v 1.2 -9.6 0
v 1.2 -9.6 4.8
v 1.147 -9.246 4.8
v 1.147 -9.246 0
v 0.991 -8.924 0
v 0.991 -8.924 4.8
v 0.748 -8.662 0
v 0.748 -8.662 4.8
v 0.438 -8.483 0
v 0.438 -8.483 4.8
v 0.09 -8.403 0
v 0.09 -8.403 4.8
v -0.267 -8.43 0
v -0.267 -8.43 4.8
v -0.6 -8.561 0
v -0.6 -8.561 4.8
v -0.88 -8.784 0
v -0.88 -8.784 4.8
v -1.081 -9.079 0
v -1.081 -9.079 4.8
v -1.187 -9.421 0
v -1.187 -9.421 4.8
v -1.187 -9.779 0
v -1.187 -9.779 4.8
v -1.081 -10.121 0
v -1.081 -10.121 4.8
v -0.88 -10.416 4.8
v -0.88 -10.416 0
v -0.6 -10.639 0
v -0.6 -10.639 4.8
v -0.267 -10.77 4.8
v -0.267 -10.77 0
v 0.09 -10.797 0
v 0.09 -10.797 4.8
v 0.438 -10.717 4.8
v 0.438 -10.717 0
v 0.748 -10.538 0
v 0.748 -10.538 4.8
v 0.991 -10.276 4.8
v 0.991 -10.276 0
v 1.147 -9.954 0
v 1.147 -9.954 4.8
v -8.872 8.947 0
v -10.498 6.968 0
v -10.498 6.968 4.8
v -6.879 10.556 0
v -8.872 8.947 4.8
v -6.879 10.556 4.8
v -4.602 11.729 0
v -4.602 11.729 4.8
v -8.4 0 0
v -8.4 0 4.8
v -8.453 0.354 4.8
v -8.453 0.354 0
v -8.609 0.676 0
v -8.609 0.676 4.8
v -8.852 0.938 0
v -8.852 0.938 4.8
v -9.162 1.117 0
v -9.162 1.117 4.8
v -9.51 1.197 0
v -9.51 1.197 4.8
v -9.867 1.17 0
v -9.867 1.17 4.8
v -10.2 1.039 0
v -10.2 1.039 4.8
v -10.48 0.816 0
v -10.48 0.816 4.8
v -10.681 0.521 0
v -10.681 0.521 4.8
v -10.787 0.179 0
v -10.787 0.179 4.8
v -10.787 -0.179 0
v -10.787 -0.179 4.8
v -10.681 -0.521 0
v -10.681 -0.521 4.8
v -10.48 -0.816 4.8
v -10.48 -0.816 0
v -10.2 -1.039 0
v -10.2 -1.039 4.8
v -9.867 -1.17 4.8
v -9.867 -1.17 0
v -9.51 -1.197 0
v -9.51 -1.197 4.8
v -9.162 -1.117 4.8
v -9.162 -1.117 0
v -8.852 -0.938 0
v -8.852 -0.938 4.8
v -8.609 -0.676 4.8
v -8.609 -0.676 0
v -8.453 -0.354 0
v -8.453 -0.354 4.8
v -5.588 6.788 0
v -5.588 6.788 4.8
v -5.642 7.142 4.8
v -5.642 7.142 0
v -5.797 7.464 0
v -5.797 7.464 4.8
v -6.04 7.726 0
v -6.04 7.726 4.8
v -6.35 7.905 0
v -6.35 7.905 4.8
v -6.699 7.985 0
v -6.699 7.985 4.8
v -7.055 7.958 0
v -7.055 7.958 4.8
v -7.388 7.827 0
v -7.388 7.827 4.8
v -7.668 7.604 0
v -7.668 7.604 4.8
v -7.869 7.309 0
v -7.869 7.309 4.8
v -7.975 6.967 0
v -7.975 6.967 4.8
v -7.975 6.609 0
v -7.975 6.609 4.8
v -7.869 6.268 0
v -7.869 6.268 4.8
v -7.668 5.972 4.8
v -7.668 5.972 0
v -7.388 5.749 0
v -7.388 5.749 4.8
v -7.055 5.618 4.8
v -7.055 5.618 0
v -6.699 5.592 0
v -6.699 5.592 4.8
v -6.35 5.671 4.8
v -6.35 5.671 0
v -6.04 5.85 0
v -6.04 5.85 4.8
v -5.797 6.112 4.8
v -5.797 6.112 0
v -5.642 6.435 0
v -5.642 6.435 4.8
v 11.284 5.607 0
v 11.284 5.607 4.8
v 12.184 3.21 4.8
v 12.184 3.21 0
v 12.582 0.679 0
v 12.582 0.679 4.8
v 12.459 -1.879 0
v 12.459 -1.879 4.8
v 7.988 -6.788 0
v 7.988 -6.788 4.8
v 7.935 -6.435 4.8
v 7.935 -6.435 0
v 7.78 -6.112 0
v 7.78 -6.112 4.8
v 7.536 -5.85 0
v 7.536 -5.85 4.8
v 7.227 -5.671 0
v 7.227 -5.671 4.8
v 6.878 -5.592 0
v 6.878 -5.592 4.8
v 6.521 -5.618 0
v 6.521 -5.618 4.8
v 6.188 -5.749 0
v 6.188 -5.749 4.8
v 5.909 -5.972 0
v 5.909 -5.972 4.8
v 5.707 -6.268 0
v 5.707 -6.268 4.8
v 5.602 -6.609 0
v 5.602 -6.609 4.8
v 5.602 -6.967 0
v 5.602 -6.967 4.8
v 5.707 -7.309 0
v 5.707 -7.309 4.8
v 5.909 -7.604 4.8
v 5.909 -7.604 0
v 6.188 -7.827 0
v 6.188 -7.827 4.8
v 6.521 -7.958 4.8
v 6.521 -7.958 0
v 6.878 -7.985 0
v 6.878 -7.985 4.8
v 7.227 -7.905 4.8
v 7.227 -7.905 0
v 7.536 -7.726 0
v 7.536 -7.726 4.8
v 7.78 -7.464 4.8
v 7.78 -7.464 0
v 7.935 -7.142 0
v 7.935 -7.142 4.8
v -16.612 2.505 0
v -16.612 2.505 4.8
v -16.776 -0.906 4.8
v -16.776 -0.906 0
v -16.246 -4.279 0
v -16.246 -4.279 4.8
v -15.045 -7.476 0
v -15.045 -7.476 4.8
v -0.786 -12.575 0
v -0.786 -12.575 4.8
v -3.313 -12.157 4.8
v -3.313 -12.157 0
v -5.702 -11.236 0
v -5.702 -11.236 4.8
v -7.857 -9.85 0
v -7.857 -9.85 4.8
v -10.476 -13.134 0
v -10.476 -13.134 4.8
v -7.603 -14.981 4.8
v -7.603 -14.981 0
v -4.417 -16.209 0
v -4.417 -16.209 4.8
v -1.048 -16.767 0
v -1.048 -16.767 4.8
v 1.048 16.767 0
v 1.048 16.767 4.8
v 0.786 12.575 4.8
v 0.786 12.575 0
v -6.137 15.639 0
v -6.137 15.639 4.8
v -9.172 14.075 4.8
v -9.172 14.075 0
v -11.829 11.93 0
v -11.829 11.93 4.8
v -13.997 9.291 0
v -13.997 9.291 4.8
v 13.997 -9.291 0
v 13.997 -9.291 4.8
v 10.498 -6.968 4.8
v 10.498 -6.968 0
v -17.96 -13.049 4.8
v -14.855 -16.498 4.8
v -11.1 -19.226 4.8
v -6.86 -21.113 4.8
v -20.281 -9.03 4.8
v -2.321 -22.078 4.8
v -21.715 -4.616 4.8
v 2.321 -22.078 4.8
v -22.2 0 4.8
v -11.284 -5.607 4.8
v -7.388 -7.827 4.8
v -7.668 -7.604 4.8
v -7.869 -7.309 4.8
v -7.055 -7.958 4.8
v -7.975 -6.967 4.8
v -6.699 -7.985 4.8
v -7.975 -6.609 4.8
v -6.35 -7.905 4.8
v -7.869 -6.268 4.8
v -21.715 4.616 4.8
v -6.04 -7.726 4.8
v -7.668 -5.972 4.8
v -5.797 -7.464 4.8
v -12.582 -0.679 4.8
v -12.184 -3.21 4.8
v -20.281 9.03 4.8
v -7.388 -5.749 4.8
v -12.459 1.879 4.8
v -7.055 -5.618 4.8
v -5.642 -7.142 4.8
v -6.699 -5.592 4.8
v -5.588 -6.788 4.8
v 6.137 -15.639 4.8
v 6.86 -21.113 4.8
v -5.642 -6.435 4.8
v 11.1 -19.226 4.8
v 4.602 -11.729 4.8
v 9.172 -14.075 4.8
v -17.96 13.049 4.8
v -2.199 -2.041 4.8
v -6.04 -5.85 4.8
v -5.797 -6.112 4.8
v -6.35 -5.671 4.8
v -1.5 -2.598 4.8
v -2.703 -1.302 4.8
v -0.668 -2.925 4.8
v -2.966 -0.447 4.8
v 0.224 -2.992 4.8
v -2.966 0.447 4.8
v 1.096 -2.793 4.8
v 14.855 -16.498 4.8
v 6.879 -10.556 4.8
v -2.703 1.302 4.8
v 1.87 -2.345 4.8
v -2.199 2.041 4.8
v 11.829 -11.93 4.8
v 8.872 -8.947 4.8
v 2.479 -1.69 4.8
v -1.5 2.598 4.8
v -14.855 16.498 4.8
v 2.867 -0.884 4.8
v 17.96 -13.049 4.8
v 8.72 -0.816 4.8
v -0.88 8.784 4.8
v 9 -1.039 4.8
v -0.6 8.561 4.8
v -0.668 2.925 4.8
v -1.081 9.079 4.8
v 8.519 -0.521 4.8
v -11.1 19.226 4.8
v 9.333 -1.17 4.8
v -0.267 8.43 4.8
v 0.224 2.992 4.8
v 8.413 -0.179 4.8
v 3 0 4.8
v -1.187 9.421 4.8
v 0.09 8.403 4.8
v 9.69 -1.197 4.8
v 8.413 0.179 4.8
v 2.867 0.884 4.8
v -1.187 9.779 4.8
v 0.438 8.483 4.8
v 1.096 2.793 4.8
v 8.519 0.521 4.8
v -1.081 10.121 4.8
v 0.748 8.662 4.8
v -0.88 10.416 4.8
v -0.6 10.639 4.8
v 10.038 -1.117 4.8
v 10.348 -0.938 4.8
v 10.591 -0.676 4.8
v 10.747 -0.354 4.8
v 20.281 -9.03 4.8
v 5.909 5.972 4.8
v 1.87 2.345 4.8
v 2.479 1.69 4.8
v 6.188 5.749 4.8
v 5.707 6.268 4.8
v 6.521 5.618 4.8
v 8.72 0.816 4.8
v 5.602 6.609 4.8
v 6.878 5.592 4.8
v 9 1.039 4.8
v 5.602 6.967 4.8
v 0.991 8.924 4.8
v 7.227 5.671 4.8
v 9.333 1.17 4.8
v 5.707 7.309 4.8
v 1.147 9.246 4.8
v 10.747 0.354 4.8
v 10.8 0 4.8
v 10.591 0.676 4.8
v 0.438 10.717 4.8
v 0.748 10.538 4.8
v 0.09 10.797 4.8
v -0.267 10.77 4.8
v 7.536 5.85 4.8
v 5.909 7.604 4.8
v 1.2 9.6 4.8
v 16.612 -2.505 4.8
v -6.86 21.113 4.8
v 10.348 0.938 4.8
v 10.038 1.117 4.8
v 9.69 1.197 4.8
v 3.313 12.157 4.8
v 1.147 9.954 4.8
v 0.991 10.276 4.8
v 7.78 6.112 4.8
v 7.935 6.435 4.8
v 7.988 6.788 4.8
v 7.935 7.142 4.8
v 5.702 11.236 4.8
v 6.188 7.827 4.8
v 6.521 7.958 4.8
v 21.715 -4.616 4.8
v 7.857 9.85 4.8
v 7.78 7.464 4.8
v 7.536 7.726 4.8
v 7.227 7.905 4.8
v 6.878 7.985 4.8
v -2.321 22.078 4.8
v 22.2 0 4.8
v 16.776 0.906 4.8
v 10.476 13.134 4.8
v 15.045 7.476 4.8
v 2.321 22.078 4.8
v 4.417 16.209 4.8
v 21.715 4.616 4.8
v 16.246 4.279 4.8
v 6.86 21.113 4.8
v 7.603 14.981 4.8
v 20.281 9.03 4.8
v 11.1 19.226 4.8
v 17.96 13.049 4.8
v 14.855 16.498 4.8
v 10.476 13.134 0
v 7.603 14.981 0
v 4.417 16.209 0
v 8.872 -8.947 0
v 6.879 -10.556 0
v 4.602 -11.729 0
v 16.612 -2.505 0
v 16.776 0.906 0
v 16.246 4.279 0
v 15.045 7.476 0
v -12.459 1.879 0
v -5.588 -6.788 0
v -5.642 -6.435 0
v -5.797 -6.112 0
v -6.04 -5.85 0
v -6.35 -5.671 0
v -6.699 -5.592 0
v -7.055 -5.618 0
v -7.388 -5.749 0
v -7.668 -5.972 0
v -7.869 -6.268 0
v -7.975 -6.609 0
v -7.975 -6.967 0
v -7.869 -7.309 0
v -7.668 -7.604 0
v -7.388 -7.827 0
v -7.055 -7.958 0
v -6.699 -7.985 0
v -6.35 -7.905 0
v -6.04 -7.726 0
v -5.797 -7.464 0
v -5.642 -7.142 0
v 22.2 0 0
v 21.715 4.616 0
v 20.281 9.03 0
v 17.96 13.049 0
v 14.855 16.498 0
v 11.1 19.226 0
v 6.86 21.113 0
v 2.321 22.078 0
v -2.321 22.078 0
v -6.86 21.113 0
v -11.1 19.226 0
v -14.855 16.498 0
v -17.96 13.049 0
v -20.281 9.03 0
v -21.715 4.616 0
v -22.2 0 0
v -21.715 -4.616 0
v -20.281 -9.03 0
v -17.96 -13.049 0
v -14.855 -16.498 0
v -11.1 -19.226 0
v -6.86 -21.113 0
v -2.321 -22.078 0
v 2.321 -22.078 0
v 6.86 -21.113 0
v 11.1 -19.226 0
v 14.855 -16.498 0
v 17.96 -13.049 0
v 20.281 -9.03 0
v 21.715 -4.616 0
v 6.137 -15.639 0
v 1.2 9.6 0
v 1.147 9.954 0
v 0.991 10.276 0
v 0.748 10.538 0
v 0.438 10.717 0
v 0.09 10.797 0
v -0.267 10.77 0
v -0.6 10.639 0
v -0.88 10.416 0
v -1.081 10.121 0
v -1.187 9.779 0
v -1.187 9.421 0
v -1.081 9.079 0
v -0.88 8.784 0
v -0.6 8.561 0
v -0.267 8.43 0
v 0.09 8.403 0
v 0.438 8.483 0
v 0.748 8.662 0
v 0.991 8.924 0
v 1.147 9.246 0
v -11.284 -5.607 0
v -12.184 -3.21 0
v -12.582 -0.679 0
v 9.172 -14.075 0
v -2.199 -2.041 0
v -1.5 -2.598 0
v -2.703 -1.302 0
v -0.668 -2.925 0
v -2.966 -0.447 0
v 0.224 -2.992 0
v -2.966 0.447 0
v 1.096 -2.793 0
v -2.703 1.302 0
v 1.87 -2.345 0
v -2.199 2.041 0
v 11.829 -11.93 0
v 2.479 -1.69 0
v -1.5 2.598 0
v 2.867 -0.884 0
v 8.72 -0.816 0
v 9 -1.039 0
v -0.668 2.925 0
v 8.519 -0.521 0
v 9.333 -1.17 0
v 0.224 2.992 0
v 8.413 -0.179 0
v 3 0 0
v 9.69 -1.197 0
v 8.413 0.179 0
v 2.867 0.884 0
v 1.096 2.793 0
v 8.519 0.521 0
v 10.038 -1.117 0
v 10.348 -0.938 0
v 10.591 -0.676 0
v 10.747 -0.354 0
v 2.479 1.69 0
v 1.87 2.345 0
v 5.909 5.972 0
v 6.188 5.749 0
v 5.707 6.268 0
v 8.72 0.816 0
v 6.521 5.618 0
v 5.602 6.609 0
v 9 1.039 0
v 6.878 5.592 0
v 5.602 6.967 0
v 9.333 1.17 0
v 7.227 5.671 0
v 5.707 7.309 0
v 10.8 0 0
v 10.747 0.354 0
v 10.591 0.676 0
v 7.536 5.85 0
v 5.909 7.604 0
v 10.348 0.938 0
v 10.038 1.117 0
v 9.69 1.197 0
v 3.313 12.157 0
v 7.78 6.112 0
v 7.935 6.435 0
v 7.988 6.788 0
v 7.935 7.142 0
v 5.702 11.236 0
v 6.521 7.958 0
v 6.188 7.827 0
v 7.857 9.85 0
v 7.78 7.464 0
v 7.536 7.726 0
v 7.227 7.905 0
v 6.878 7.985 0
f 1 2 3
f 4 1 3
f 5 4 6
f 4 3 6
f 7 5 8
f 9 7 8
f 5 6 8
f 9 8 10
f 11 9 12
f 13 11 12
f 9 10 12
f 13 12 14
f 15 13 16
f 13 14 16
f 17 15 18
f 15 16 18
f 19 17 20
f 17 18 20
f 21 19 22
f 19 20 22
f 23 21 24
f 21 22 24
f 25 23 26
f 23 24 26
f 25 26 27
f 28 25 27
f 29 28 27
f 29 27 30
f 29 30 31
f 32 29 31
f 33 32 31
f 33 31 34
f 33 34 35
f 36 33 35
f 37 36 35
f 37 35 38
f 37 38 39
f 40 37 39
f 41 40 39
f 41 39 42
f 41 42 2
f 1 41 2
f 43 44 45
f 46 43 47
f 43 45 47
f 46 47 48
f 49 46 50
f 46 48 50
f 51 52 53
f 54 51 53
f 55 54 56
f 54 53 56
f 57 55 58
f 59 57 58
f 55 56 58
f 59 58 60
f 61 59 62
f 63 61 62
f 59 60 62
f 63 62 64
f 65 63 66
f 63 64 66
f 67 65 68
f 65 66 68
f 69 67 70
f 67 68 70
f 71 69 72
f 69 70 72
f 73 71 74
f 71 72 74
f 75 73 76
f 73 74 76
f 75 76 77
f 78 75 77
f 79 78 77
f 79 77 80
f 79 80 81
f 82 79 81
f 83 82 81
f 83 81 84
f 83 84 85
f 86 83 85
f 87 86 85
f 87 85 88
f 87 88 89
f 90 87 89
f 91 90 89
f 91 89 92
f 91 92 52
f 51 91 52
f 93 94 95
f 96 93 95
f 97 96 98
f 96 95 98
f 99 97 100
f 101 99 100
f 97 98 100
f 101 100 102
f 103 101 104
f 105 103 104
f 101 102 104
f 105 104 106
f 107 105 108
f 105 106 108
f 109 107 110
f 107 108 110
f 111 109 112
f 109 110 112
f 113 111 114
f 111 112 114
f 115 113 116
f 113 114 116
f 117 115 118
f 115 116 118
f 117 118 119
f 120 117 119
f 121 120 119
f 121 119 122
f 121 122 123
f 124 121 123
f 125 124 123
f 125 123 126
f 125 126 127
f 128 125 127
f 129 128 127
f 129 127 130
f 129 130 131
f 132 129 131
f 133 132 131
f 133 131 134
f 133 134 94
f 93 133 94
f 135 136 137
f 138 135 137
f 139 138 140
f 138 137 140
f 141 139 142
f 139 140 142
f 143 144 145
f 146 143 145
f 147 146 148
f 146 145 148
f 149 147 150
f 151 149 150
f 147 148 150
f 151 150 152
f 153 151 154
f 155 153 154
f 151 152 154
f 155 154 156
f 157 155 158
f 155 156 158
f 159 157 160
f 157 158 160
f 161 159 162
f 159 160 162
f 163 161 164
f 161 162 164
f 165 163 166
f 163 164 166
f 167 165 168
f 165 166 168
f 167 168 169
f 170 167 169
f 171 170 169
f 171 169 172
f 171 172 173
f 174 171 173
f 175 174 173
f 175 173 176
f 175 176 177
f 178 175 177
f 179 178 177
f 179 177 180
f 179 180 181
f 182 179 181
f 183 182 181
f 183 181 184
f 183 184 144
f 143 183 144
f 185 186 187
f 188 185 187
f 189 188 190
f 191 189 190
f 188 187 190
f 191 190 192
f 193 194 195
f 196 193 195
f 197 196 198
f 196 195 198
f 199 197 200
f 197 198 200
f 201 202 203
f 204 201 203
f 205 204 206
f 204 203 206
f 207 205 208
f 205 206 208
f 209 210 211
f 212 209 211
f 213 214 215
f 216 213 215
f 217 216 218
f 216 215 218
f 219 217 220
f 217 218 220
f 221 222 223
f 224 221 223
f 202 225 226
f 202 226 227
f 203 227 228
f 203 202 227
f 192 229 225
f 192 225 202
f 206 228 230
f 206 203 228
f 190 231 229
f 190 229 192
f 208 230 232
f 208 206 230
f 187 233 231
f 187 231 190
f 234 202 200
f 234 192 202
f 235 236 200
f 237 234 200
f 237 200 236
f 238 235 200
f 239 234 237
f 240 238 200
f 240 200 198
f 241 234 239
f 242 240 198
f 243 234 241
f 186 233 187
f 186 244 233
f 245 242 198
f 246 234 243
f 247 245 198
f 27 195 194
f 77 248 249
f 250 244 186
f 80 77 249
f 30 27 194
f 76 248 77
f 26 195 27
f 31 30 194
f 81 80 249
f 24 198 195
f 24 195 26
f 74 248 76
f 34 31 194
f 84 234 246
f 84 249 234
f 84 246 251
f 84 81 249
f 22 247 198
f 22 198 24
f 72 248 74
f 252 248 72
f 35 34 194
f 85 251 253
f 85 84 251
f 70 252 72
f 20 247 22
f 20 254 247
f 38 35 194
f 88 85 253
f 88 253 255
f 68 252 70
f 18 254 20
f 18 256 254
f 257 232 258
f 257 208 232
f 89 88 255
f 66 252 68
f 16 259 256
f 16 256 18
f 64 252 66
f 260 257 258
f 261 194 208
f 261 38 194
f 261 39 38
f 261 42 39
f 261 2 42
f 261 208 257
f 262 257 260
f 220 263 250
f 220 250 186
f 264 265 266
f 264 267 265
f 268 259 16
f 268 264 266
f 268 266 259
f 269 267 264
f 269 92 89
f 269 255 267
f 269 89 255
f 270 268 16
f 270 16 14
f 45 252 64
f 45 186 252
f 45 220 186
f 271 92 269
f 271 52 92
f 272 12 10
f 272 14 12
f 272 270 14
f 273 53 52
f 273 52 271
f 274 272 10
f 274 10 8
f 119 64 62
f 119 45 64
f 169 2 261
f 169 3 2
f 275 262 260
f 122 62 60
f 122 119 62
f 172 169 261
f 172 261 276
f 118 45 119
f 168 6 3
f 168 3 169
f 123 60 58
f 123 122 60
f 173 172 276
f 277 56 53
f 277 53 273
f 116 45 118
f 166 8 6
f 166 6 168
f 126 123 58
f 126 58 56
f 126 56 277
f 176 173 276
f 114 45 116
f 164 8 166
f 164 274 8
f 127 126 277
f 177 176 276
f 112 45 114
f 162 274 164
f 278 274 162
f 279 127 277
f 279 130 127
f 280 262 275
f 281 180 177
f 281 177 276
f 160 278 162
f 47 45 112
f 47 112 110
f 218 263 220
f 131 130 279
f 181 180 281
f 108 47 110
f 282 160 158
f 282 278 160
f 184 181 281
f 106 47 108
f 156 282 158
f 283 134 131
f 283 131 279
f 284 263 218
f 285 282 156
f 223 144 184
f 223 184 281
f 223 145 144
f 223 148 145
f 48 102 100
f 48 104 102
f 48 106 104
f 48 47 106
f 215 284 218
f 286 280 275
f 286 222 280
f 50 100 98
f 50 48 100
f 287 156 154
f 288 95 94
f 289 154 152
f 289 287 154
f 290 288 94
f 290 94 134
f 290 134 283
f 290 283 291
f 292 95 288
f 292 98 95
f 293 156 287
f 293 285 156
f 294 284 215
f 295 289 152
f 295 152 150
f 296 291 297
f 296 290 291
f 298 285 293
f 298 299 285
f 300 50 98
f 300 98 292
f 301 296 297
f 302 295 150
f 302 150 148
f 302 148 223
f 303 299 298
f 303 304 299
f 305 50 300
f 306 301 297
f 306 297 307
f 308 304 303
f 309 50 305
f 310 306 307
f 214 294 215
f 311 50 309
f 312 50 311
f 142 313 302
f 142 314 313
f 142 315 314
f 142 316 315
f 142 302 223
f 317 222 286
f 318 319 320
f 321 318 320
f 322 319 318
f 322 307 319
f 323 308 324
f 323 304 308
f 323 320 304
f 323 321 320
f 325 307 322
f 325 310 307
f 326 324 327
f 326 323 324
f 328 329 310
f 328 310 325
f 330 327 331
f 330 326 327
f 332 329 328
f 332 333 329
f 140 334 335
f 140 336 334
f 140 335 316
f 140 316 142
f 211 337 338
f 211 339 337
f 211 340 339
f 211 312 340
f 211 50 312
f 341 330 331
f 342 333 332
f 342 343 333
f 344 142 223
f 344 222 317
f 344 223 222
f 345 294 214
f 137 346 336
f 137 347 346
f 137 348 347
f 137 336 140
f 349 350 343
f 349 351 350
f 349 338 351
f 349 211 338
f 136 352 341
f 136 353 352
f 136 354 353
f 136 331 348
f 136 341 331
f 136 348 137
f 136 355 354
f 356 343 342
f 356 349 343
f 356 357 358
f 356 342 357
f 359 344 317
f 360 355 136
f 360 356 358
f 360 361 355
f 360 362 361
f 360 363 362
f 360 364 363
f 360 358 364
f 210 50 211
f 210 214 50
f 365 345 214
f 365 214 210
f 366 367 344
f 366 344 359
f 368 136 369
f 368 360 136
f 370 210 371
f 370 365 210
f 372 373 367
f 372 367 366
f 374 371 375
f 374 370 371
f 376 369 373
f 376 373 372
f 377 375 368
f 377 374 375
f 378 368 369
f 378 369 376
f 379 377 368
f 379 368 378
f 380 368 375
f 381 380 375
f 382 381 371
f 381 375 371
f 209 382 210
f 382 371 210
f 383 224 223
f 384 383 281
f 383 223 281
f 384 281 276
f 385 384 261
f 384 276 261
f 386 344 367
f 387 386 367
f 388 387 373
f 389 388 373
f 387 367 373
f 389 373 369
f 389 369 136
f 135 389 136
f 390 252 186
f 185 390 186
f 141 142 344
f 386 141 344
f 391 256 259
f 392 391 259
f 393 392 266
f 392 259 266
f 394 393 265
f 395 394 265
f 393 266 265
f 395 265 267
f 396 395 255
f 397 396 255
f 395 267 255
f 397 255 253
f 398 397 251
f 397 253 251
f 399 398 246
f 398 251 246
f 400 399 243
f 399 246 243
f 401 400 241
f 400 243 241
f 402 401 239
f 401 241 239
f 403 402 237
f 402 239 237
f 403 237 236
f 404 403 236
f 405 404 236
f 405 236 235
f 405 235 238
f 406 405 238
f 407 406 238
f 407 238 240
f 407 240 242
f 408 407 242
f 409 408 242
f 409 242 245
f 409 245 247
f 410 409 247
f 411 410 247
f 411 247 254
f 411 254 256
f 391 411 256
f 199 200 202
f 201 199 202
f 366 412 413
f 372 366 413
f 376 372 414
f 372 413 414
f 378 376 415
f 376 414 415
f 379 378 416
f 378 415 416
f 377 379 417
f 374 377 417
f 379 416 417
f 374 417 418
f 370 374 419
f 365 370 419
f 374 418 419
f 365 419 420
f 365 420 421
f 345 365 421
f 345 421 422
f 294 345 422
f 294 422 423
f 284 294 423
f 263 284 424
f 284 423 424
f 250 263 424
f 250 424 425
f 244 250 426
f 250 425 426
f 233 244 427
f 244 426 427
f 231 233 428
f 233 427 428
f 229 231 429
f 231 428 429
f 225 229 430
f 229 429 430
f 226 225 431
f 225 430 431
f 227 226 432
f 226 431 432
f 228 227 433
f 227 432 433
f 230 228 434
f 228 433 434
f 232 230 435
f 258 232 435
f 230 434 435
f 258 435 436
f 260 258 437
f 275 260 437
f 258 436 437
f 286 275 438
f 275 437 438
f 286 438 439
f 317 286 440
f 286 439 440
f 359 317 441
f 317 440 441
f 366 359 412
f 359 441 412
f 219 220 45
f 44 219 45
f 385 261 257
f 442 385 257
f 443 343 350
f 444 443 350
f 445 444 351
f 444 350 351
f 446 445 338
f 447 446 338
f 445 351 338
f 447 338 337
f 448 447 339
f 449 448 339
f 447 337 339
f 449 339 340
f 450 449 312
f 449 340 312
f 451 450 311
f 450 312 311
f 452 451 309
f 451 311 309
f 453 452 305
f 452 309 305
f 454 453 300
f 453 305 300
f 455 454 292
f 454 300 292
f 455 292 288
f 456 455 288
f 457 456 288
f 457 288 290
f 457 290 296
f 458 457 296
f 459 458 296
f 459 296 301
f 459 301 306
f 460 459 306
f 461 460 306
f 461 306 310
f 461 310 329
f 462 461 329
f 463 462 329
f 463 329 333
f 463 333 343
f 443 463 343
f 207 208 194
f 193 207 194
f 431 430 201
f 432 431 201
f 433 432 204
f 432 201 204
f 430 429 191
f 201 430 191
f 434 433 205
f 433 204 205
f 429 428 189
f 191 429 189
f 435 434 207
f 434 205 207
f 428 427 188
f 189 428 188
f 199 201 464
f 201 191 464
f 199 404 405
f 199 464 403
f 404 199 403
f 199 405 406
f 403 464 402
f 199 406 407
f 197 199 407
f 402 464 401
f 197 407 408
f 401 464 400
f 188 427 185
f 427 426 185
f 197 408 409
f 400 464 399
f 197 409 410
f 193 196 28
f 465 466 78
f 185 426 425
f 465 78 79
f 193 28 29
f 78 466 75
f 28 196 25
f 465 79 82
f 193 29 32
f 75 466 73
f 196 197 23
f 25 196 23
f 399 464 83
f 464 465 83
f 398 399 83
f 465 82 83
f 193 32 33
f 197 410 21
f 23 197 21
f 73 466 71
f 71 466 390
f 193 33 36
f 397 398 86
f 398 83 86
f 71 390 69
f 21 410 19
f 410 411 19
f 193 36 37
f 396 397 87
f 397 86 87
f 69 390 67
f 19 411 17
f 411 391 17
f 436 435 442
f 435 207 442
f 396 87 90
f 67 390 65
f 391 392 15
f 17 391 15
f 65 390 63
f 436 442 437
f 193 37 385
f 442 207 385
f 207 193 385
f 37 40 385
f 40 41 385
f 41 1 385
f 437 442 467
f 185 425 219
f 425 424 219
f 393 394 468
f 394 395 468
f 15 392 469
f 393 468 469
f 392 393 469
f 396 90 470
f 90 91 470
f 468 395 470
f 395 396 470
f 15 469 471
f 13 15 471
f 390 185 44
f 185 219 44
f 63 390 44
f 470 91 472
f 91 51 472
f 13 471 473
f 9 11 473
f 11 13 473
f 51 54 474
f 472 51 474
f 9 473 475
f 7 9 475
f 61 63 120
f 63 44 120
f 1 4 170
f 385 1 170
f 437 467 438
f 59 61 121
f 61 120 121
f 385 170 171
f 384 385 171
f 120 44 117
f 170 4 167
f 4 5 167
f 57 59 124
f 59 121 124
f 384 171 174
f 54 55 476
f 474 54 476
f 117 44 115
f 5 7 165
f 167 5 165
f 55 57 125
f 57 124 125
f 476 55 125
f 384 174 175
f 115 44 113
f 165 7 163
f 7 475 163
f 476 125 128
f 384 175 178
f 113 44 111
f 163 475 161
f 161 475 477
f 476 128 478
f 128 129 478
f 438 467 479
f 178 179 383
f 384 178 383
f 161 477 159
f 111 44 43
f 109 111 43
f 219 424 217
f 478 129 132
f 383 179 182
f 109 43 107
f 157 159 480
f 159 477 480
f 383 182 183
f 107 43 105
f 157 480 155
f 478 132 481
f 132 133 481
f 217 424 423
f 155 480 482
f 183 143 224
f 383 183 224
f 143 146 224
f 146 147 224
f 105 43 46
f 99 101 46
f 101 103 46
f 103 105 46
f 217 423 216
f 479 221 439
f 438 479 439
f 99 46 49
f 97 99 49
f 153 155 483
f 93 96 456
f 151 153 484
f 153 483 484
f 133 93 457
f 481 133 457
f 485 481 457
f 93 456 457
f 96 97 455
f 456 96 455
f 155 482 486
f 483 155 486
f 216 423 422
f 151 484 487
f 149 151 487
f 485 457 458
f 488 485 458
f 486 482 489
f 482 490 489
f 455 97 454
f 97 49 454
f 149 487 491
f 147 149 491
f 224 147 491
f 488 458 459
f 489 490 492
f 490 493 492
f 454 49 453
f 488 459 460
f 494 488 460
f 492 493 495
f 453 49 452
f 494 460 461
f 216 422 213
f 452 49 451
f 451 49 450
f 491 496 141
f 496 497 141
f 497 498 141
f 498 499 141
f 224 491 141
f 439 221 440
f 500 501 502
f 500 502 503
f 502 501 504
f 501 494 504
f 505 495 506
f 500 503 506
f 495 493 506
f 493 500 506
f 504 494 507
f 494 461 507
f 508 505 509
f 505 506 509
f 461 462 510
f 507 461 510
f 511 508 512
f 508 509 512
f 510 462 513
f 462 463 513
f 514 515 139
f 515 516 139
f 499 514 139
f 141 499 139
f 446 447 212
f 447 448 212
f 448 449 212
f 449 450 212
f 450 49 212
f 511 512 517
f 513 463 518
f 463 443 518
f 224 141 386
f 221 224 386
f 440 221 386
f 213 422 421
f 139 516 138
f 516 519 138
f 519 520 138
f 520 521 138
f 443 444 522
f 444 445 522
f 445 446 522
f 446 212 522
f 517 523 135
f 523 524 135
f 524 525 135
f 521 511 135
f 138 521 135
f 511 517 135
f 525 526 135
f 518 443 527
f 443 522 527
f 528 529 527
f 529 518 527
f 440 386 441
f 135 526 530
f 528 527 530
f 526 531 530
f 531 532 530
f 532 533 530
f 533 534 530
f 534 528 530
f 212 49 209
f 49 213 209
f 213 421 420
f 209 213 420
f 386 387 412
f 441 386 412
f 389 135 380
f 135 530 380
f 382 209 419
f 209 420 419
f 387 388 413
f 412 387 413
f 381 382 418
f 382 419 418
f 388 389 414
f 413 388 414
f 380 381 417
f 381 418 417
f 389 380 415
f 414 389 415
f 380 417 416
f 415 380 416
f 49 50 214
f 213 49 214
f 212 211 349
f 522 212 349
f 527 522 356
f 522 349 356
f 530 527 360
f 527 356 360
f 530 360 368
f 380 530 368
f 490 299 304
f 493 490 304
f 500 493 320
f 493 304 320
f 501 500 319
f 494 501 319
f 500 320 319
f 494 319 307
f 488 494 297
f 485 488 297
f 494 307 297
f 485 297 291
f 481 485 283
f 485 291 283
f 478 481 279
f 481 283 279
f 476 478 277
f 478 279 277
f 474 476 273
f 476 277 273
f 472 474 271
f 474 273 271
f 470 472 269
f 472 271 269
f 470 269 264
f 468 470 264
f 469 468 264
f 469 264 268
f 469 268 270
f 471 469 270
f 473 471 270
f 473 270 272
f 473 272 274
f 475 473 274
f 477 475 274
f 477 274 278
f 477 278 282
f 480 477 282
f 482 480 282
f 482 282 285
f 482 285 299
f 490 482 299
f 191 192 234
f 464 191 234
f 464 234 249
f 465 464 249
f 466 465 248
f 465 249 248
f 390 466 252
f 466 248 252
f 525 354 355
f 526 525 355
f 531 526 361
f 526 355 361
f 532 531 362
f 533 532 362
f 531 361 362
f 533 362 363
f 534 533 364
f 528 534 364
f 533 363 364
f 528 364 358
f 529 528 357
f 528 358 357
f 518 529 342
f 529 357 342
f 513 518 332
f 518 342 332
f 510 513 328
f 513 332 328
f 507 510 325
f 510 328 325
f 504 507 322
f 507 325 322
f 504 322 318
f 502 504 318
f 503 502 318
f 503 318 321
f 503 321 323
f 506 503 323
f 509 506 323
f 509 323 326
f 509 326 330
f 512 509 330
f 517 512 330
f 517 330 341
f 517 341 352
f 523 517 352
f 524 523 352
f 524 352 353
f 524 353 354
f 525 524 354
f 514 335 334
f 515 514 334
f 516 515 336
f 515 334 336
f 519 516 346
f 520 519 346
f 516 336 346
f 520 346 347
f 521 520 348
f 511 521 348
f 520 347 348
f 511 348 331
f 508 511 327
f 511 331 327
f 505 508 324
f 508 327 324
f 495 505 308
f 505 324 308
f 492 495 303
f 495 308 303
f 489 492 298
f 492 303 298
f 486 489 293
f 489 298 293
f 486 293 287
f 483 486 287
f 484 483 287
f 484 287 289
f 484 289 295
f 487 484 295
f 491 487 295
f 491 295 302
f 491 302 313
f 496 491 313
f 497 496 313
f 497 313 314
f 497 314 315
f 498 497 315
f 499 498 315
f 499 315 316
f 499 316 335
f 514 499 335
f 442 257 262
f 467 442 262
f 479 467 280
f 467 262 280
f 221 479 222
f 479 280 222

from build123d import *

# Parameters (mm, degrees)
ESQUISSE1_R             = 22.2
BOSS_EXTRU_1_DEPTH      = 4.8
ESQUISSE2_R             = 3
ESQUISSE2_R_2           = 1.2
ENL_V_MAT_EXTRU_1_DEPTH = 32.760352643


with BuildPart() as part:
    # Esquisse1 → Boss.-Extru.1 (new body)
    with BuildSketch(Plane.XY):
        Circle(ESQUISSE1_R)
    extrude(amount=BOSS_EXTRU_1_DEPTH)

    # Esquisse2 → Enlèv. mat.-Extru.1 (cut, through all)
    with BuildSketch(Plane.XY.offset(4.8)):
        Circle(ESQUISSE2_R)
        with Locations((9.6, 0)):
            Circle(ESQUISSE2_R_2)
        with Locations((6.788225099, -6.788225099)):
            Circle(ESQUISSE2_R_2)
        with Locations((0, -9.6)):
            Circle(ESQUISSE2_R_2)
        with Locations((-6.788225099, -6.788225099)):
            Circle(ESQUISSE2_R_2)
        with Locations((-9.6, 0)):
            Circle(ESQUISSE2_R_2)
        with Locations((-6.788225099, 6.788225099)):
            Circle(ESQUISSE2_R_2)
        with Locations((0, 9.6)):
            Circle(ESQUISSE2_R_2)
        with Locations((6.788225099, 6.788225099)):
            Circle(ESQUISSE2_R_2)
        with BuildLine():
            Line((-13.996985601, 9.29109219), (-10.497739201, 6.968319142))
            ThreePointArc((-10.497739201, 6.968319142), (-7.916457842, 9.802535144), (-4.602380866, 11.729368711))
            Line((-4.602380866, 11.729368711), (-6.136507821, 15.639158282))
            ThreePointArc((-6.136507821, 15.639158282), (-10.555277122, 13.070046858), (-13.996985601, 9.29109219))
        make_face()
        with BuildLine():
            Line((1.047829065, 16.767291202), (0.785871799, 12.575468401))
            ThreePointArc((0.785871799, 12.575468401), (4.531015535, 11.757121171), (7.856740841, 9.850463103))
            Line((7.856740841, 9.850463103), (10.475654455, 13.133950804))
            ThreePointArc((10.475654455, 13.133950804), (6.041354047, 15.676161561), (1.047829065, 16.767291202))
        make_face()
        with BuildLine():
            Line((15.044814666, 7.476199012), (11.283610999, 5.607149259))
            ThreePointArc((11.283610999, 5.607149259), (12.447473377, 1.954586027), (12.459121707, -1.878905608))
            Line((12.459121707, -1.878905608), (16.612162276, -2.505207477))
            ThreePointArc((16.612162276, -2.505207477), (16.596631169, 2.606114703), (15.044814666, 7.476199012))
        make_face()
        with BuildLine():
            Line((13.996985601, -9.29109219), (10.497739201, -6.968319142))
            ThreePointArc((10.497739201, -6.968319142), (7.916457842, -9.802535144), (4.602380866, -11.729368711))
            Line((4.602380866, -11.729368711), (6.136507821, -15.639158282))
            ThreePointArc((6.136507821, -15.639158282), (10.555277122, -13.070046858), (13.996985601, -9.29109219))
        make_face()
        with BuildLine():
            Line((-1.047829065, -16.767291202), (-0.785871799, -12.575468401))
            ThreePointArc((-0.785871799, -12.575468401), (-4.531015535, -11.757121171), (-7.856740841, -9.850463103))
            Line((-7.856740841, -9.850463103), (-10.475654455, -13.133950804))
            ThreePointArc((-10.475654455, -13.133950804), (-6.041354047, -15.676161561), (-1.047829065, -16.767291202))
        make_face()
        with BuildLine():
            Line((-15.044814666, -7.476199012), (-11.283610999, -5.607149259))
            ThreePointArc((-11.283610999, -5.607149259), (-12.447473377, -1.954586027), (-12.459121707, 1.878905608))
            Line((-12.459121707, 1.878905608), (-16.612162276, 2.505207477))
            ThreePointArc((-16.612162276, 2.505207477), (-16.596631169, -2.606114703), (-15.044814666, -7.476199012))
        make_face()
    extrude(amount=-ENL_V_MAT_EXTRU_1_DEPTH, mode=Mode.SUBTRACT)


solid = part.part
